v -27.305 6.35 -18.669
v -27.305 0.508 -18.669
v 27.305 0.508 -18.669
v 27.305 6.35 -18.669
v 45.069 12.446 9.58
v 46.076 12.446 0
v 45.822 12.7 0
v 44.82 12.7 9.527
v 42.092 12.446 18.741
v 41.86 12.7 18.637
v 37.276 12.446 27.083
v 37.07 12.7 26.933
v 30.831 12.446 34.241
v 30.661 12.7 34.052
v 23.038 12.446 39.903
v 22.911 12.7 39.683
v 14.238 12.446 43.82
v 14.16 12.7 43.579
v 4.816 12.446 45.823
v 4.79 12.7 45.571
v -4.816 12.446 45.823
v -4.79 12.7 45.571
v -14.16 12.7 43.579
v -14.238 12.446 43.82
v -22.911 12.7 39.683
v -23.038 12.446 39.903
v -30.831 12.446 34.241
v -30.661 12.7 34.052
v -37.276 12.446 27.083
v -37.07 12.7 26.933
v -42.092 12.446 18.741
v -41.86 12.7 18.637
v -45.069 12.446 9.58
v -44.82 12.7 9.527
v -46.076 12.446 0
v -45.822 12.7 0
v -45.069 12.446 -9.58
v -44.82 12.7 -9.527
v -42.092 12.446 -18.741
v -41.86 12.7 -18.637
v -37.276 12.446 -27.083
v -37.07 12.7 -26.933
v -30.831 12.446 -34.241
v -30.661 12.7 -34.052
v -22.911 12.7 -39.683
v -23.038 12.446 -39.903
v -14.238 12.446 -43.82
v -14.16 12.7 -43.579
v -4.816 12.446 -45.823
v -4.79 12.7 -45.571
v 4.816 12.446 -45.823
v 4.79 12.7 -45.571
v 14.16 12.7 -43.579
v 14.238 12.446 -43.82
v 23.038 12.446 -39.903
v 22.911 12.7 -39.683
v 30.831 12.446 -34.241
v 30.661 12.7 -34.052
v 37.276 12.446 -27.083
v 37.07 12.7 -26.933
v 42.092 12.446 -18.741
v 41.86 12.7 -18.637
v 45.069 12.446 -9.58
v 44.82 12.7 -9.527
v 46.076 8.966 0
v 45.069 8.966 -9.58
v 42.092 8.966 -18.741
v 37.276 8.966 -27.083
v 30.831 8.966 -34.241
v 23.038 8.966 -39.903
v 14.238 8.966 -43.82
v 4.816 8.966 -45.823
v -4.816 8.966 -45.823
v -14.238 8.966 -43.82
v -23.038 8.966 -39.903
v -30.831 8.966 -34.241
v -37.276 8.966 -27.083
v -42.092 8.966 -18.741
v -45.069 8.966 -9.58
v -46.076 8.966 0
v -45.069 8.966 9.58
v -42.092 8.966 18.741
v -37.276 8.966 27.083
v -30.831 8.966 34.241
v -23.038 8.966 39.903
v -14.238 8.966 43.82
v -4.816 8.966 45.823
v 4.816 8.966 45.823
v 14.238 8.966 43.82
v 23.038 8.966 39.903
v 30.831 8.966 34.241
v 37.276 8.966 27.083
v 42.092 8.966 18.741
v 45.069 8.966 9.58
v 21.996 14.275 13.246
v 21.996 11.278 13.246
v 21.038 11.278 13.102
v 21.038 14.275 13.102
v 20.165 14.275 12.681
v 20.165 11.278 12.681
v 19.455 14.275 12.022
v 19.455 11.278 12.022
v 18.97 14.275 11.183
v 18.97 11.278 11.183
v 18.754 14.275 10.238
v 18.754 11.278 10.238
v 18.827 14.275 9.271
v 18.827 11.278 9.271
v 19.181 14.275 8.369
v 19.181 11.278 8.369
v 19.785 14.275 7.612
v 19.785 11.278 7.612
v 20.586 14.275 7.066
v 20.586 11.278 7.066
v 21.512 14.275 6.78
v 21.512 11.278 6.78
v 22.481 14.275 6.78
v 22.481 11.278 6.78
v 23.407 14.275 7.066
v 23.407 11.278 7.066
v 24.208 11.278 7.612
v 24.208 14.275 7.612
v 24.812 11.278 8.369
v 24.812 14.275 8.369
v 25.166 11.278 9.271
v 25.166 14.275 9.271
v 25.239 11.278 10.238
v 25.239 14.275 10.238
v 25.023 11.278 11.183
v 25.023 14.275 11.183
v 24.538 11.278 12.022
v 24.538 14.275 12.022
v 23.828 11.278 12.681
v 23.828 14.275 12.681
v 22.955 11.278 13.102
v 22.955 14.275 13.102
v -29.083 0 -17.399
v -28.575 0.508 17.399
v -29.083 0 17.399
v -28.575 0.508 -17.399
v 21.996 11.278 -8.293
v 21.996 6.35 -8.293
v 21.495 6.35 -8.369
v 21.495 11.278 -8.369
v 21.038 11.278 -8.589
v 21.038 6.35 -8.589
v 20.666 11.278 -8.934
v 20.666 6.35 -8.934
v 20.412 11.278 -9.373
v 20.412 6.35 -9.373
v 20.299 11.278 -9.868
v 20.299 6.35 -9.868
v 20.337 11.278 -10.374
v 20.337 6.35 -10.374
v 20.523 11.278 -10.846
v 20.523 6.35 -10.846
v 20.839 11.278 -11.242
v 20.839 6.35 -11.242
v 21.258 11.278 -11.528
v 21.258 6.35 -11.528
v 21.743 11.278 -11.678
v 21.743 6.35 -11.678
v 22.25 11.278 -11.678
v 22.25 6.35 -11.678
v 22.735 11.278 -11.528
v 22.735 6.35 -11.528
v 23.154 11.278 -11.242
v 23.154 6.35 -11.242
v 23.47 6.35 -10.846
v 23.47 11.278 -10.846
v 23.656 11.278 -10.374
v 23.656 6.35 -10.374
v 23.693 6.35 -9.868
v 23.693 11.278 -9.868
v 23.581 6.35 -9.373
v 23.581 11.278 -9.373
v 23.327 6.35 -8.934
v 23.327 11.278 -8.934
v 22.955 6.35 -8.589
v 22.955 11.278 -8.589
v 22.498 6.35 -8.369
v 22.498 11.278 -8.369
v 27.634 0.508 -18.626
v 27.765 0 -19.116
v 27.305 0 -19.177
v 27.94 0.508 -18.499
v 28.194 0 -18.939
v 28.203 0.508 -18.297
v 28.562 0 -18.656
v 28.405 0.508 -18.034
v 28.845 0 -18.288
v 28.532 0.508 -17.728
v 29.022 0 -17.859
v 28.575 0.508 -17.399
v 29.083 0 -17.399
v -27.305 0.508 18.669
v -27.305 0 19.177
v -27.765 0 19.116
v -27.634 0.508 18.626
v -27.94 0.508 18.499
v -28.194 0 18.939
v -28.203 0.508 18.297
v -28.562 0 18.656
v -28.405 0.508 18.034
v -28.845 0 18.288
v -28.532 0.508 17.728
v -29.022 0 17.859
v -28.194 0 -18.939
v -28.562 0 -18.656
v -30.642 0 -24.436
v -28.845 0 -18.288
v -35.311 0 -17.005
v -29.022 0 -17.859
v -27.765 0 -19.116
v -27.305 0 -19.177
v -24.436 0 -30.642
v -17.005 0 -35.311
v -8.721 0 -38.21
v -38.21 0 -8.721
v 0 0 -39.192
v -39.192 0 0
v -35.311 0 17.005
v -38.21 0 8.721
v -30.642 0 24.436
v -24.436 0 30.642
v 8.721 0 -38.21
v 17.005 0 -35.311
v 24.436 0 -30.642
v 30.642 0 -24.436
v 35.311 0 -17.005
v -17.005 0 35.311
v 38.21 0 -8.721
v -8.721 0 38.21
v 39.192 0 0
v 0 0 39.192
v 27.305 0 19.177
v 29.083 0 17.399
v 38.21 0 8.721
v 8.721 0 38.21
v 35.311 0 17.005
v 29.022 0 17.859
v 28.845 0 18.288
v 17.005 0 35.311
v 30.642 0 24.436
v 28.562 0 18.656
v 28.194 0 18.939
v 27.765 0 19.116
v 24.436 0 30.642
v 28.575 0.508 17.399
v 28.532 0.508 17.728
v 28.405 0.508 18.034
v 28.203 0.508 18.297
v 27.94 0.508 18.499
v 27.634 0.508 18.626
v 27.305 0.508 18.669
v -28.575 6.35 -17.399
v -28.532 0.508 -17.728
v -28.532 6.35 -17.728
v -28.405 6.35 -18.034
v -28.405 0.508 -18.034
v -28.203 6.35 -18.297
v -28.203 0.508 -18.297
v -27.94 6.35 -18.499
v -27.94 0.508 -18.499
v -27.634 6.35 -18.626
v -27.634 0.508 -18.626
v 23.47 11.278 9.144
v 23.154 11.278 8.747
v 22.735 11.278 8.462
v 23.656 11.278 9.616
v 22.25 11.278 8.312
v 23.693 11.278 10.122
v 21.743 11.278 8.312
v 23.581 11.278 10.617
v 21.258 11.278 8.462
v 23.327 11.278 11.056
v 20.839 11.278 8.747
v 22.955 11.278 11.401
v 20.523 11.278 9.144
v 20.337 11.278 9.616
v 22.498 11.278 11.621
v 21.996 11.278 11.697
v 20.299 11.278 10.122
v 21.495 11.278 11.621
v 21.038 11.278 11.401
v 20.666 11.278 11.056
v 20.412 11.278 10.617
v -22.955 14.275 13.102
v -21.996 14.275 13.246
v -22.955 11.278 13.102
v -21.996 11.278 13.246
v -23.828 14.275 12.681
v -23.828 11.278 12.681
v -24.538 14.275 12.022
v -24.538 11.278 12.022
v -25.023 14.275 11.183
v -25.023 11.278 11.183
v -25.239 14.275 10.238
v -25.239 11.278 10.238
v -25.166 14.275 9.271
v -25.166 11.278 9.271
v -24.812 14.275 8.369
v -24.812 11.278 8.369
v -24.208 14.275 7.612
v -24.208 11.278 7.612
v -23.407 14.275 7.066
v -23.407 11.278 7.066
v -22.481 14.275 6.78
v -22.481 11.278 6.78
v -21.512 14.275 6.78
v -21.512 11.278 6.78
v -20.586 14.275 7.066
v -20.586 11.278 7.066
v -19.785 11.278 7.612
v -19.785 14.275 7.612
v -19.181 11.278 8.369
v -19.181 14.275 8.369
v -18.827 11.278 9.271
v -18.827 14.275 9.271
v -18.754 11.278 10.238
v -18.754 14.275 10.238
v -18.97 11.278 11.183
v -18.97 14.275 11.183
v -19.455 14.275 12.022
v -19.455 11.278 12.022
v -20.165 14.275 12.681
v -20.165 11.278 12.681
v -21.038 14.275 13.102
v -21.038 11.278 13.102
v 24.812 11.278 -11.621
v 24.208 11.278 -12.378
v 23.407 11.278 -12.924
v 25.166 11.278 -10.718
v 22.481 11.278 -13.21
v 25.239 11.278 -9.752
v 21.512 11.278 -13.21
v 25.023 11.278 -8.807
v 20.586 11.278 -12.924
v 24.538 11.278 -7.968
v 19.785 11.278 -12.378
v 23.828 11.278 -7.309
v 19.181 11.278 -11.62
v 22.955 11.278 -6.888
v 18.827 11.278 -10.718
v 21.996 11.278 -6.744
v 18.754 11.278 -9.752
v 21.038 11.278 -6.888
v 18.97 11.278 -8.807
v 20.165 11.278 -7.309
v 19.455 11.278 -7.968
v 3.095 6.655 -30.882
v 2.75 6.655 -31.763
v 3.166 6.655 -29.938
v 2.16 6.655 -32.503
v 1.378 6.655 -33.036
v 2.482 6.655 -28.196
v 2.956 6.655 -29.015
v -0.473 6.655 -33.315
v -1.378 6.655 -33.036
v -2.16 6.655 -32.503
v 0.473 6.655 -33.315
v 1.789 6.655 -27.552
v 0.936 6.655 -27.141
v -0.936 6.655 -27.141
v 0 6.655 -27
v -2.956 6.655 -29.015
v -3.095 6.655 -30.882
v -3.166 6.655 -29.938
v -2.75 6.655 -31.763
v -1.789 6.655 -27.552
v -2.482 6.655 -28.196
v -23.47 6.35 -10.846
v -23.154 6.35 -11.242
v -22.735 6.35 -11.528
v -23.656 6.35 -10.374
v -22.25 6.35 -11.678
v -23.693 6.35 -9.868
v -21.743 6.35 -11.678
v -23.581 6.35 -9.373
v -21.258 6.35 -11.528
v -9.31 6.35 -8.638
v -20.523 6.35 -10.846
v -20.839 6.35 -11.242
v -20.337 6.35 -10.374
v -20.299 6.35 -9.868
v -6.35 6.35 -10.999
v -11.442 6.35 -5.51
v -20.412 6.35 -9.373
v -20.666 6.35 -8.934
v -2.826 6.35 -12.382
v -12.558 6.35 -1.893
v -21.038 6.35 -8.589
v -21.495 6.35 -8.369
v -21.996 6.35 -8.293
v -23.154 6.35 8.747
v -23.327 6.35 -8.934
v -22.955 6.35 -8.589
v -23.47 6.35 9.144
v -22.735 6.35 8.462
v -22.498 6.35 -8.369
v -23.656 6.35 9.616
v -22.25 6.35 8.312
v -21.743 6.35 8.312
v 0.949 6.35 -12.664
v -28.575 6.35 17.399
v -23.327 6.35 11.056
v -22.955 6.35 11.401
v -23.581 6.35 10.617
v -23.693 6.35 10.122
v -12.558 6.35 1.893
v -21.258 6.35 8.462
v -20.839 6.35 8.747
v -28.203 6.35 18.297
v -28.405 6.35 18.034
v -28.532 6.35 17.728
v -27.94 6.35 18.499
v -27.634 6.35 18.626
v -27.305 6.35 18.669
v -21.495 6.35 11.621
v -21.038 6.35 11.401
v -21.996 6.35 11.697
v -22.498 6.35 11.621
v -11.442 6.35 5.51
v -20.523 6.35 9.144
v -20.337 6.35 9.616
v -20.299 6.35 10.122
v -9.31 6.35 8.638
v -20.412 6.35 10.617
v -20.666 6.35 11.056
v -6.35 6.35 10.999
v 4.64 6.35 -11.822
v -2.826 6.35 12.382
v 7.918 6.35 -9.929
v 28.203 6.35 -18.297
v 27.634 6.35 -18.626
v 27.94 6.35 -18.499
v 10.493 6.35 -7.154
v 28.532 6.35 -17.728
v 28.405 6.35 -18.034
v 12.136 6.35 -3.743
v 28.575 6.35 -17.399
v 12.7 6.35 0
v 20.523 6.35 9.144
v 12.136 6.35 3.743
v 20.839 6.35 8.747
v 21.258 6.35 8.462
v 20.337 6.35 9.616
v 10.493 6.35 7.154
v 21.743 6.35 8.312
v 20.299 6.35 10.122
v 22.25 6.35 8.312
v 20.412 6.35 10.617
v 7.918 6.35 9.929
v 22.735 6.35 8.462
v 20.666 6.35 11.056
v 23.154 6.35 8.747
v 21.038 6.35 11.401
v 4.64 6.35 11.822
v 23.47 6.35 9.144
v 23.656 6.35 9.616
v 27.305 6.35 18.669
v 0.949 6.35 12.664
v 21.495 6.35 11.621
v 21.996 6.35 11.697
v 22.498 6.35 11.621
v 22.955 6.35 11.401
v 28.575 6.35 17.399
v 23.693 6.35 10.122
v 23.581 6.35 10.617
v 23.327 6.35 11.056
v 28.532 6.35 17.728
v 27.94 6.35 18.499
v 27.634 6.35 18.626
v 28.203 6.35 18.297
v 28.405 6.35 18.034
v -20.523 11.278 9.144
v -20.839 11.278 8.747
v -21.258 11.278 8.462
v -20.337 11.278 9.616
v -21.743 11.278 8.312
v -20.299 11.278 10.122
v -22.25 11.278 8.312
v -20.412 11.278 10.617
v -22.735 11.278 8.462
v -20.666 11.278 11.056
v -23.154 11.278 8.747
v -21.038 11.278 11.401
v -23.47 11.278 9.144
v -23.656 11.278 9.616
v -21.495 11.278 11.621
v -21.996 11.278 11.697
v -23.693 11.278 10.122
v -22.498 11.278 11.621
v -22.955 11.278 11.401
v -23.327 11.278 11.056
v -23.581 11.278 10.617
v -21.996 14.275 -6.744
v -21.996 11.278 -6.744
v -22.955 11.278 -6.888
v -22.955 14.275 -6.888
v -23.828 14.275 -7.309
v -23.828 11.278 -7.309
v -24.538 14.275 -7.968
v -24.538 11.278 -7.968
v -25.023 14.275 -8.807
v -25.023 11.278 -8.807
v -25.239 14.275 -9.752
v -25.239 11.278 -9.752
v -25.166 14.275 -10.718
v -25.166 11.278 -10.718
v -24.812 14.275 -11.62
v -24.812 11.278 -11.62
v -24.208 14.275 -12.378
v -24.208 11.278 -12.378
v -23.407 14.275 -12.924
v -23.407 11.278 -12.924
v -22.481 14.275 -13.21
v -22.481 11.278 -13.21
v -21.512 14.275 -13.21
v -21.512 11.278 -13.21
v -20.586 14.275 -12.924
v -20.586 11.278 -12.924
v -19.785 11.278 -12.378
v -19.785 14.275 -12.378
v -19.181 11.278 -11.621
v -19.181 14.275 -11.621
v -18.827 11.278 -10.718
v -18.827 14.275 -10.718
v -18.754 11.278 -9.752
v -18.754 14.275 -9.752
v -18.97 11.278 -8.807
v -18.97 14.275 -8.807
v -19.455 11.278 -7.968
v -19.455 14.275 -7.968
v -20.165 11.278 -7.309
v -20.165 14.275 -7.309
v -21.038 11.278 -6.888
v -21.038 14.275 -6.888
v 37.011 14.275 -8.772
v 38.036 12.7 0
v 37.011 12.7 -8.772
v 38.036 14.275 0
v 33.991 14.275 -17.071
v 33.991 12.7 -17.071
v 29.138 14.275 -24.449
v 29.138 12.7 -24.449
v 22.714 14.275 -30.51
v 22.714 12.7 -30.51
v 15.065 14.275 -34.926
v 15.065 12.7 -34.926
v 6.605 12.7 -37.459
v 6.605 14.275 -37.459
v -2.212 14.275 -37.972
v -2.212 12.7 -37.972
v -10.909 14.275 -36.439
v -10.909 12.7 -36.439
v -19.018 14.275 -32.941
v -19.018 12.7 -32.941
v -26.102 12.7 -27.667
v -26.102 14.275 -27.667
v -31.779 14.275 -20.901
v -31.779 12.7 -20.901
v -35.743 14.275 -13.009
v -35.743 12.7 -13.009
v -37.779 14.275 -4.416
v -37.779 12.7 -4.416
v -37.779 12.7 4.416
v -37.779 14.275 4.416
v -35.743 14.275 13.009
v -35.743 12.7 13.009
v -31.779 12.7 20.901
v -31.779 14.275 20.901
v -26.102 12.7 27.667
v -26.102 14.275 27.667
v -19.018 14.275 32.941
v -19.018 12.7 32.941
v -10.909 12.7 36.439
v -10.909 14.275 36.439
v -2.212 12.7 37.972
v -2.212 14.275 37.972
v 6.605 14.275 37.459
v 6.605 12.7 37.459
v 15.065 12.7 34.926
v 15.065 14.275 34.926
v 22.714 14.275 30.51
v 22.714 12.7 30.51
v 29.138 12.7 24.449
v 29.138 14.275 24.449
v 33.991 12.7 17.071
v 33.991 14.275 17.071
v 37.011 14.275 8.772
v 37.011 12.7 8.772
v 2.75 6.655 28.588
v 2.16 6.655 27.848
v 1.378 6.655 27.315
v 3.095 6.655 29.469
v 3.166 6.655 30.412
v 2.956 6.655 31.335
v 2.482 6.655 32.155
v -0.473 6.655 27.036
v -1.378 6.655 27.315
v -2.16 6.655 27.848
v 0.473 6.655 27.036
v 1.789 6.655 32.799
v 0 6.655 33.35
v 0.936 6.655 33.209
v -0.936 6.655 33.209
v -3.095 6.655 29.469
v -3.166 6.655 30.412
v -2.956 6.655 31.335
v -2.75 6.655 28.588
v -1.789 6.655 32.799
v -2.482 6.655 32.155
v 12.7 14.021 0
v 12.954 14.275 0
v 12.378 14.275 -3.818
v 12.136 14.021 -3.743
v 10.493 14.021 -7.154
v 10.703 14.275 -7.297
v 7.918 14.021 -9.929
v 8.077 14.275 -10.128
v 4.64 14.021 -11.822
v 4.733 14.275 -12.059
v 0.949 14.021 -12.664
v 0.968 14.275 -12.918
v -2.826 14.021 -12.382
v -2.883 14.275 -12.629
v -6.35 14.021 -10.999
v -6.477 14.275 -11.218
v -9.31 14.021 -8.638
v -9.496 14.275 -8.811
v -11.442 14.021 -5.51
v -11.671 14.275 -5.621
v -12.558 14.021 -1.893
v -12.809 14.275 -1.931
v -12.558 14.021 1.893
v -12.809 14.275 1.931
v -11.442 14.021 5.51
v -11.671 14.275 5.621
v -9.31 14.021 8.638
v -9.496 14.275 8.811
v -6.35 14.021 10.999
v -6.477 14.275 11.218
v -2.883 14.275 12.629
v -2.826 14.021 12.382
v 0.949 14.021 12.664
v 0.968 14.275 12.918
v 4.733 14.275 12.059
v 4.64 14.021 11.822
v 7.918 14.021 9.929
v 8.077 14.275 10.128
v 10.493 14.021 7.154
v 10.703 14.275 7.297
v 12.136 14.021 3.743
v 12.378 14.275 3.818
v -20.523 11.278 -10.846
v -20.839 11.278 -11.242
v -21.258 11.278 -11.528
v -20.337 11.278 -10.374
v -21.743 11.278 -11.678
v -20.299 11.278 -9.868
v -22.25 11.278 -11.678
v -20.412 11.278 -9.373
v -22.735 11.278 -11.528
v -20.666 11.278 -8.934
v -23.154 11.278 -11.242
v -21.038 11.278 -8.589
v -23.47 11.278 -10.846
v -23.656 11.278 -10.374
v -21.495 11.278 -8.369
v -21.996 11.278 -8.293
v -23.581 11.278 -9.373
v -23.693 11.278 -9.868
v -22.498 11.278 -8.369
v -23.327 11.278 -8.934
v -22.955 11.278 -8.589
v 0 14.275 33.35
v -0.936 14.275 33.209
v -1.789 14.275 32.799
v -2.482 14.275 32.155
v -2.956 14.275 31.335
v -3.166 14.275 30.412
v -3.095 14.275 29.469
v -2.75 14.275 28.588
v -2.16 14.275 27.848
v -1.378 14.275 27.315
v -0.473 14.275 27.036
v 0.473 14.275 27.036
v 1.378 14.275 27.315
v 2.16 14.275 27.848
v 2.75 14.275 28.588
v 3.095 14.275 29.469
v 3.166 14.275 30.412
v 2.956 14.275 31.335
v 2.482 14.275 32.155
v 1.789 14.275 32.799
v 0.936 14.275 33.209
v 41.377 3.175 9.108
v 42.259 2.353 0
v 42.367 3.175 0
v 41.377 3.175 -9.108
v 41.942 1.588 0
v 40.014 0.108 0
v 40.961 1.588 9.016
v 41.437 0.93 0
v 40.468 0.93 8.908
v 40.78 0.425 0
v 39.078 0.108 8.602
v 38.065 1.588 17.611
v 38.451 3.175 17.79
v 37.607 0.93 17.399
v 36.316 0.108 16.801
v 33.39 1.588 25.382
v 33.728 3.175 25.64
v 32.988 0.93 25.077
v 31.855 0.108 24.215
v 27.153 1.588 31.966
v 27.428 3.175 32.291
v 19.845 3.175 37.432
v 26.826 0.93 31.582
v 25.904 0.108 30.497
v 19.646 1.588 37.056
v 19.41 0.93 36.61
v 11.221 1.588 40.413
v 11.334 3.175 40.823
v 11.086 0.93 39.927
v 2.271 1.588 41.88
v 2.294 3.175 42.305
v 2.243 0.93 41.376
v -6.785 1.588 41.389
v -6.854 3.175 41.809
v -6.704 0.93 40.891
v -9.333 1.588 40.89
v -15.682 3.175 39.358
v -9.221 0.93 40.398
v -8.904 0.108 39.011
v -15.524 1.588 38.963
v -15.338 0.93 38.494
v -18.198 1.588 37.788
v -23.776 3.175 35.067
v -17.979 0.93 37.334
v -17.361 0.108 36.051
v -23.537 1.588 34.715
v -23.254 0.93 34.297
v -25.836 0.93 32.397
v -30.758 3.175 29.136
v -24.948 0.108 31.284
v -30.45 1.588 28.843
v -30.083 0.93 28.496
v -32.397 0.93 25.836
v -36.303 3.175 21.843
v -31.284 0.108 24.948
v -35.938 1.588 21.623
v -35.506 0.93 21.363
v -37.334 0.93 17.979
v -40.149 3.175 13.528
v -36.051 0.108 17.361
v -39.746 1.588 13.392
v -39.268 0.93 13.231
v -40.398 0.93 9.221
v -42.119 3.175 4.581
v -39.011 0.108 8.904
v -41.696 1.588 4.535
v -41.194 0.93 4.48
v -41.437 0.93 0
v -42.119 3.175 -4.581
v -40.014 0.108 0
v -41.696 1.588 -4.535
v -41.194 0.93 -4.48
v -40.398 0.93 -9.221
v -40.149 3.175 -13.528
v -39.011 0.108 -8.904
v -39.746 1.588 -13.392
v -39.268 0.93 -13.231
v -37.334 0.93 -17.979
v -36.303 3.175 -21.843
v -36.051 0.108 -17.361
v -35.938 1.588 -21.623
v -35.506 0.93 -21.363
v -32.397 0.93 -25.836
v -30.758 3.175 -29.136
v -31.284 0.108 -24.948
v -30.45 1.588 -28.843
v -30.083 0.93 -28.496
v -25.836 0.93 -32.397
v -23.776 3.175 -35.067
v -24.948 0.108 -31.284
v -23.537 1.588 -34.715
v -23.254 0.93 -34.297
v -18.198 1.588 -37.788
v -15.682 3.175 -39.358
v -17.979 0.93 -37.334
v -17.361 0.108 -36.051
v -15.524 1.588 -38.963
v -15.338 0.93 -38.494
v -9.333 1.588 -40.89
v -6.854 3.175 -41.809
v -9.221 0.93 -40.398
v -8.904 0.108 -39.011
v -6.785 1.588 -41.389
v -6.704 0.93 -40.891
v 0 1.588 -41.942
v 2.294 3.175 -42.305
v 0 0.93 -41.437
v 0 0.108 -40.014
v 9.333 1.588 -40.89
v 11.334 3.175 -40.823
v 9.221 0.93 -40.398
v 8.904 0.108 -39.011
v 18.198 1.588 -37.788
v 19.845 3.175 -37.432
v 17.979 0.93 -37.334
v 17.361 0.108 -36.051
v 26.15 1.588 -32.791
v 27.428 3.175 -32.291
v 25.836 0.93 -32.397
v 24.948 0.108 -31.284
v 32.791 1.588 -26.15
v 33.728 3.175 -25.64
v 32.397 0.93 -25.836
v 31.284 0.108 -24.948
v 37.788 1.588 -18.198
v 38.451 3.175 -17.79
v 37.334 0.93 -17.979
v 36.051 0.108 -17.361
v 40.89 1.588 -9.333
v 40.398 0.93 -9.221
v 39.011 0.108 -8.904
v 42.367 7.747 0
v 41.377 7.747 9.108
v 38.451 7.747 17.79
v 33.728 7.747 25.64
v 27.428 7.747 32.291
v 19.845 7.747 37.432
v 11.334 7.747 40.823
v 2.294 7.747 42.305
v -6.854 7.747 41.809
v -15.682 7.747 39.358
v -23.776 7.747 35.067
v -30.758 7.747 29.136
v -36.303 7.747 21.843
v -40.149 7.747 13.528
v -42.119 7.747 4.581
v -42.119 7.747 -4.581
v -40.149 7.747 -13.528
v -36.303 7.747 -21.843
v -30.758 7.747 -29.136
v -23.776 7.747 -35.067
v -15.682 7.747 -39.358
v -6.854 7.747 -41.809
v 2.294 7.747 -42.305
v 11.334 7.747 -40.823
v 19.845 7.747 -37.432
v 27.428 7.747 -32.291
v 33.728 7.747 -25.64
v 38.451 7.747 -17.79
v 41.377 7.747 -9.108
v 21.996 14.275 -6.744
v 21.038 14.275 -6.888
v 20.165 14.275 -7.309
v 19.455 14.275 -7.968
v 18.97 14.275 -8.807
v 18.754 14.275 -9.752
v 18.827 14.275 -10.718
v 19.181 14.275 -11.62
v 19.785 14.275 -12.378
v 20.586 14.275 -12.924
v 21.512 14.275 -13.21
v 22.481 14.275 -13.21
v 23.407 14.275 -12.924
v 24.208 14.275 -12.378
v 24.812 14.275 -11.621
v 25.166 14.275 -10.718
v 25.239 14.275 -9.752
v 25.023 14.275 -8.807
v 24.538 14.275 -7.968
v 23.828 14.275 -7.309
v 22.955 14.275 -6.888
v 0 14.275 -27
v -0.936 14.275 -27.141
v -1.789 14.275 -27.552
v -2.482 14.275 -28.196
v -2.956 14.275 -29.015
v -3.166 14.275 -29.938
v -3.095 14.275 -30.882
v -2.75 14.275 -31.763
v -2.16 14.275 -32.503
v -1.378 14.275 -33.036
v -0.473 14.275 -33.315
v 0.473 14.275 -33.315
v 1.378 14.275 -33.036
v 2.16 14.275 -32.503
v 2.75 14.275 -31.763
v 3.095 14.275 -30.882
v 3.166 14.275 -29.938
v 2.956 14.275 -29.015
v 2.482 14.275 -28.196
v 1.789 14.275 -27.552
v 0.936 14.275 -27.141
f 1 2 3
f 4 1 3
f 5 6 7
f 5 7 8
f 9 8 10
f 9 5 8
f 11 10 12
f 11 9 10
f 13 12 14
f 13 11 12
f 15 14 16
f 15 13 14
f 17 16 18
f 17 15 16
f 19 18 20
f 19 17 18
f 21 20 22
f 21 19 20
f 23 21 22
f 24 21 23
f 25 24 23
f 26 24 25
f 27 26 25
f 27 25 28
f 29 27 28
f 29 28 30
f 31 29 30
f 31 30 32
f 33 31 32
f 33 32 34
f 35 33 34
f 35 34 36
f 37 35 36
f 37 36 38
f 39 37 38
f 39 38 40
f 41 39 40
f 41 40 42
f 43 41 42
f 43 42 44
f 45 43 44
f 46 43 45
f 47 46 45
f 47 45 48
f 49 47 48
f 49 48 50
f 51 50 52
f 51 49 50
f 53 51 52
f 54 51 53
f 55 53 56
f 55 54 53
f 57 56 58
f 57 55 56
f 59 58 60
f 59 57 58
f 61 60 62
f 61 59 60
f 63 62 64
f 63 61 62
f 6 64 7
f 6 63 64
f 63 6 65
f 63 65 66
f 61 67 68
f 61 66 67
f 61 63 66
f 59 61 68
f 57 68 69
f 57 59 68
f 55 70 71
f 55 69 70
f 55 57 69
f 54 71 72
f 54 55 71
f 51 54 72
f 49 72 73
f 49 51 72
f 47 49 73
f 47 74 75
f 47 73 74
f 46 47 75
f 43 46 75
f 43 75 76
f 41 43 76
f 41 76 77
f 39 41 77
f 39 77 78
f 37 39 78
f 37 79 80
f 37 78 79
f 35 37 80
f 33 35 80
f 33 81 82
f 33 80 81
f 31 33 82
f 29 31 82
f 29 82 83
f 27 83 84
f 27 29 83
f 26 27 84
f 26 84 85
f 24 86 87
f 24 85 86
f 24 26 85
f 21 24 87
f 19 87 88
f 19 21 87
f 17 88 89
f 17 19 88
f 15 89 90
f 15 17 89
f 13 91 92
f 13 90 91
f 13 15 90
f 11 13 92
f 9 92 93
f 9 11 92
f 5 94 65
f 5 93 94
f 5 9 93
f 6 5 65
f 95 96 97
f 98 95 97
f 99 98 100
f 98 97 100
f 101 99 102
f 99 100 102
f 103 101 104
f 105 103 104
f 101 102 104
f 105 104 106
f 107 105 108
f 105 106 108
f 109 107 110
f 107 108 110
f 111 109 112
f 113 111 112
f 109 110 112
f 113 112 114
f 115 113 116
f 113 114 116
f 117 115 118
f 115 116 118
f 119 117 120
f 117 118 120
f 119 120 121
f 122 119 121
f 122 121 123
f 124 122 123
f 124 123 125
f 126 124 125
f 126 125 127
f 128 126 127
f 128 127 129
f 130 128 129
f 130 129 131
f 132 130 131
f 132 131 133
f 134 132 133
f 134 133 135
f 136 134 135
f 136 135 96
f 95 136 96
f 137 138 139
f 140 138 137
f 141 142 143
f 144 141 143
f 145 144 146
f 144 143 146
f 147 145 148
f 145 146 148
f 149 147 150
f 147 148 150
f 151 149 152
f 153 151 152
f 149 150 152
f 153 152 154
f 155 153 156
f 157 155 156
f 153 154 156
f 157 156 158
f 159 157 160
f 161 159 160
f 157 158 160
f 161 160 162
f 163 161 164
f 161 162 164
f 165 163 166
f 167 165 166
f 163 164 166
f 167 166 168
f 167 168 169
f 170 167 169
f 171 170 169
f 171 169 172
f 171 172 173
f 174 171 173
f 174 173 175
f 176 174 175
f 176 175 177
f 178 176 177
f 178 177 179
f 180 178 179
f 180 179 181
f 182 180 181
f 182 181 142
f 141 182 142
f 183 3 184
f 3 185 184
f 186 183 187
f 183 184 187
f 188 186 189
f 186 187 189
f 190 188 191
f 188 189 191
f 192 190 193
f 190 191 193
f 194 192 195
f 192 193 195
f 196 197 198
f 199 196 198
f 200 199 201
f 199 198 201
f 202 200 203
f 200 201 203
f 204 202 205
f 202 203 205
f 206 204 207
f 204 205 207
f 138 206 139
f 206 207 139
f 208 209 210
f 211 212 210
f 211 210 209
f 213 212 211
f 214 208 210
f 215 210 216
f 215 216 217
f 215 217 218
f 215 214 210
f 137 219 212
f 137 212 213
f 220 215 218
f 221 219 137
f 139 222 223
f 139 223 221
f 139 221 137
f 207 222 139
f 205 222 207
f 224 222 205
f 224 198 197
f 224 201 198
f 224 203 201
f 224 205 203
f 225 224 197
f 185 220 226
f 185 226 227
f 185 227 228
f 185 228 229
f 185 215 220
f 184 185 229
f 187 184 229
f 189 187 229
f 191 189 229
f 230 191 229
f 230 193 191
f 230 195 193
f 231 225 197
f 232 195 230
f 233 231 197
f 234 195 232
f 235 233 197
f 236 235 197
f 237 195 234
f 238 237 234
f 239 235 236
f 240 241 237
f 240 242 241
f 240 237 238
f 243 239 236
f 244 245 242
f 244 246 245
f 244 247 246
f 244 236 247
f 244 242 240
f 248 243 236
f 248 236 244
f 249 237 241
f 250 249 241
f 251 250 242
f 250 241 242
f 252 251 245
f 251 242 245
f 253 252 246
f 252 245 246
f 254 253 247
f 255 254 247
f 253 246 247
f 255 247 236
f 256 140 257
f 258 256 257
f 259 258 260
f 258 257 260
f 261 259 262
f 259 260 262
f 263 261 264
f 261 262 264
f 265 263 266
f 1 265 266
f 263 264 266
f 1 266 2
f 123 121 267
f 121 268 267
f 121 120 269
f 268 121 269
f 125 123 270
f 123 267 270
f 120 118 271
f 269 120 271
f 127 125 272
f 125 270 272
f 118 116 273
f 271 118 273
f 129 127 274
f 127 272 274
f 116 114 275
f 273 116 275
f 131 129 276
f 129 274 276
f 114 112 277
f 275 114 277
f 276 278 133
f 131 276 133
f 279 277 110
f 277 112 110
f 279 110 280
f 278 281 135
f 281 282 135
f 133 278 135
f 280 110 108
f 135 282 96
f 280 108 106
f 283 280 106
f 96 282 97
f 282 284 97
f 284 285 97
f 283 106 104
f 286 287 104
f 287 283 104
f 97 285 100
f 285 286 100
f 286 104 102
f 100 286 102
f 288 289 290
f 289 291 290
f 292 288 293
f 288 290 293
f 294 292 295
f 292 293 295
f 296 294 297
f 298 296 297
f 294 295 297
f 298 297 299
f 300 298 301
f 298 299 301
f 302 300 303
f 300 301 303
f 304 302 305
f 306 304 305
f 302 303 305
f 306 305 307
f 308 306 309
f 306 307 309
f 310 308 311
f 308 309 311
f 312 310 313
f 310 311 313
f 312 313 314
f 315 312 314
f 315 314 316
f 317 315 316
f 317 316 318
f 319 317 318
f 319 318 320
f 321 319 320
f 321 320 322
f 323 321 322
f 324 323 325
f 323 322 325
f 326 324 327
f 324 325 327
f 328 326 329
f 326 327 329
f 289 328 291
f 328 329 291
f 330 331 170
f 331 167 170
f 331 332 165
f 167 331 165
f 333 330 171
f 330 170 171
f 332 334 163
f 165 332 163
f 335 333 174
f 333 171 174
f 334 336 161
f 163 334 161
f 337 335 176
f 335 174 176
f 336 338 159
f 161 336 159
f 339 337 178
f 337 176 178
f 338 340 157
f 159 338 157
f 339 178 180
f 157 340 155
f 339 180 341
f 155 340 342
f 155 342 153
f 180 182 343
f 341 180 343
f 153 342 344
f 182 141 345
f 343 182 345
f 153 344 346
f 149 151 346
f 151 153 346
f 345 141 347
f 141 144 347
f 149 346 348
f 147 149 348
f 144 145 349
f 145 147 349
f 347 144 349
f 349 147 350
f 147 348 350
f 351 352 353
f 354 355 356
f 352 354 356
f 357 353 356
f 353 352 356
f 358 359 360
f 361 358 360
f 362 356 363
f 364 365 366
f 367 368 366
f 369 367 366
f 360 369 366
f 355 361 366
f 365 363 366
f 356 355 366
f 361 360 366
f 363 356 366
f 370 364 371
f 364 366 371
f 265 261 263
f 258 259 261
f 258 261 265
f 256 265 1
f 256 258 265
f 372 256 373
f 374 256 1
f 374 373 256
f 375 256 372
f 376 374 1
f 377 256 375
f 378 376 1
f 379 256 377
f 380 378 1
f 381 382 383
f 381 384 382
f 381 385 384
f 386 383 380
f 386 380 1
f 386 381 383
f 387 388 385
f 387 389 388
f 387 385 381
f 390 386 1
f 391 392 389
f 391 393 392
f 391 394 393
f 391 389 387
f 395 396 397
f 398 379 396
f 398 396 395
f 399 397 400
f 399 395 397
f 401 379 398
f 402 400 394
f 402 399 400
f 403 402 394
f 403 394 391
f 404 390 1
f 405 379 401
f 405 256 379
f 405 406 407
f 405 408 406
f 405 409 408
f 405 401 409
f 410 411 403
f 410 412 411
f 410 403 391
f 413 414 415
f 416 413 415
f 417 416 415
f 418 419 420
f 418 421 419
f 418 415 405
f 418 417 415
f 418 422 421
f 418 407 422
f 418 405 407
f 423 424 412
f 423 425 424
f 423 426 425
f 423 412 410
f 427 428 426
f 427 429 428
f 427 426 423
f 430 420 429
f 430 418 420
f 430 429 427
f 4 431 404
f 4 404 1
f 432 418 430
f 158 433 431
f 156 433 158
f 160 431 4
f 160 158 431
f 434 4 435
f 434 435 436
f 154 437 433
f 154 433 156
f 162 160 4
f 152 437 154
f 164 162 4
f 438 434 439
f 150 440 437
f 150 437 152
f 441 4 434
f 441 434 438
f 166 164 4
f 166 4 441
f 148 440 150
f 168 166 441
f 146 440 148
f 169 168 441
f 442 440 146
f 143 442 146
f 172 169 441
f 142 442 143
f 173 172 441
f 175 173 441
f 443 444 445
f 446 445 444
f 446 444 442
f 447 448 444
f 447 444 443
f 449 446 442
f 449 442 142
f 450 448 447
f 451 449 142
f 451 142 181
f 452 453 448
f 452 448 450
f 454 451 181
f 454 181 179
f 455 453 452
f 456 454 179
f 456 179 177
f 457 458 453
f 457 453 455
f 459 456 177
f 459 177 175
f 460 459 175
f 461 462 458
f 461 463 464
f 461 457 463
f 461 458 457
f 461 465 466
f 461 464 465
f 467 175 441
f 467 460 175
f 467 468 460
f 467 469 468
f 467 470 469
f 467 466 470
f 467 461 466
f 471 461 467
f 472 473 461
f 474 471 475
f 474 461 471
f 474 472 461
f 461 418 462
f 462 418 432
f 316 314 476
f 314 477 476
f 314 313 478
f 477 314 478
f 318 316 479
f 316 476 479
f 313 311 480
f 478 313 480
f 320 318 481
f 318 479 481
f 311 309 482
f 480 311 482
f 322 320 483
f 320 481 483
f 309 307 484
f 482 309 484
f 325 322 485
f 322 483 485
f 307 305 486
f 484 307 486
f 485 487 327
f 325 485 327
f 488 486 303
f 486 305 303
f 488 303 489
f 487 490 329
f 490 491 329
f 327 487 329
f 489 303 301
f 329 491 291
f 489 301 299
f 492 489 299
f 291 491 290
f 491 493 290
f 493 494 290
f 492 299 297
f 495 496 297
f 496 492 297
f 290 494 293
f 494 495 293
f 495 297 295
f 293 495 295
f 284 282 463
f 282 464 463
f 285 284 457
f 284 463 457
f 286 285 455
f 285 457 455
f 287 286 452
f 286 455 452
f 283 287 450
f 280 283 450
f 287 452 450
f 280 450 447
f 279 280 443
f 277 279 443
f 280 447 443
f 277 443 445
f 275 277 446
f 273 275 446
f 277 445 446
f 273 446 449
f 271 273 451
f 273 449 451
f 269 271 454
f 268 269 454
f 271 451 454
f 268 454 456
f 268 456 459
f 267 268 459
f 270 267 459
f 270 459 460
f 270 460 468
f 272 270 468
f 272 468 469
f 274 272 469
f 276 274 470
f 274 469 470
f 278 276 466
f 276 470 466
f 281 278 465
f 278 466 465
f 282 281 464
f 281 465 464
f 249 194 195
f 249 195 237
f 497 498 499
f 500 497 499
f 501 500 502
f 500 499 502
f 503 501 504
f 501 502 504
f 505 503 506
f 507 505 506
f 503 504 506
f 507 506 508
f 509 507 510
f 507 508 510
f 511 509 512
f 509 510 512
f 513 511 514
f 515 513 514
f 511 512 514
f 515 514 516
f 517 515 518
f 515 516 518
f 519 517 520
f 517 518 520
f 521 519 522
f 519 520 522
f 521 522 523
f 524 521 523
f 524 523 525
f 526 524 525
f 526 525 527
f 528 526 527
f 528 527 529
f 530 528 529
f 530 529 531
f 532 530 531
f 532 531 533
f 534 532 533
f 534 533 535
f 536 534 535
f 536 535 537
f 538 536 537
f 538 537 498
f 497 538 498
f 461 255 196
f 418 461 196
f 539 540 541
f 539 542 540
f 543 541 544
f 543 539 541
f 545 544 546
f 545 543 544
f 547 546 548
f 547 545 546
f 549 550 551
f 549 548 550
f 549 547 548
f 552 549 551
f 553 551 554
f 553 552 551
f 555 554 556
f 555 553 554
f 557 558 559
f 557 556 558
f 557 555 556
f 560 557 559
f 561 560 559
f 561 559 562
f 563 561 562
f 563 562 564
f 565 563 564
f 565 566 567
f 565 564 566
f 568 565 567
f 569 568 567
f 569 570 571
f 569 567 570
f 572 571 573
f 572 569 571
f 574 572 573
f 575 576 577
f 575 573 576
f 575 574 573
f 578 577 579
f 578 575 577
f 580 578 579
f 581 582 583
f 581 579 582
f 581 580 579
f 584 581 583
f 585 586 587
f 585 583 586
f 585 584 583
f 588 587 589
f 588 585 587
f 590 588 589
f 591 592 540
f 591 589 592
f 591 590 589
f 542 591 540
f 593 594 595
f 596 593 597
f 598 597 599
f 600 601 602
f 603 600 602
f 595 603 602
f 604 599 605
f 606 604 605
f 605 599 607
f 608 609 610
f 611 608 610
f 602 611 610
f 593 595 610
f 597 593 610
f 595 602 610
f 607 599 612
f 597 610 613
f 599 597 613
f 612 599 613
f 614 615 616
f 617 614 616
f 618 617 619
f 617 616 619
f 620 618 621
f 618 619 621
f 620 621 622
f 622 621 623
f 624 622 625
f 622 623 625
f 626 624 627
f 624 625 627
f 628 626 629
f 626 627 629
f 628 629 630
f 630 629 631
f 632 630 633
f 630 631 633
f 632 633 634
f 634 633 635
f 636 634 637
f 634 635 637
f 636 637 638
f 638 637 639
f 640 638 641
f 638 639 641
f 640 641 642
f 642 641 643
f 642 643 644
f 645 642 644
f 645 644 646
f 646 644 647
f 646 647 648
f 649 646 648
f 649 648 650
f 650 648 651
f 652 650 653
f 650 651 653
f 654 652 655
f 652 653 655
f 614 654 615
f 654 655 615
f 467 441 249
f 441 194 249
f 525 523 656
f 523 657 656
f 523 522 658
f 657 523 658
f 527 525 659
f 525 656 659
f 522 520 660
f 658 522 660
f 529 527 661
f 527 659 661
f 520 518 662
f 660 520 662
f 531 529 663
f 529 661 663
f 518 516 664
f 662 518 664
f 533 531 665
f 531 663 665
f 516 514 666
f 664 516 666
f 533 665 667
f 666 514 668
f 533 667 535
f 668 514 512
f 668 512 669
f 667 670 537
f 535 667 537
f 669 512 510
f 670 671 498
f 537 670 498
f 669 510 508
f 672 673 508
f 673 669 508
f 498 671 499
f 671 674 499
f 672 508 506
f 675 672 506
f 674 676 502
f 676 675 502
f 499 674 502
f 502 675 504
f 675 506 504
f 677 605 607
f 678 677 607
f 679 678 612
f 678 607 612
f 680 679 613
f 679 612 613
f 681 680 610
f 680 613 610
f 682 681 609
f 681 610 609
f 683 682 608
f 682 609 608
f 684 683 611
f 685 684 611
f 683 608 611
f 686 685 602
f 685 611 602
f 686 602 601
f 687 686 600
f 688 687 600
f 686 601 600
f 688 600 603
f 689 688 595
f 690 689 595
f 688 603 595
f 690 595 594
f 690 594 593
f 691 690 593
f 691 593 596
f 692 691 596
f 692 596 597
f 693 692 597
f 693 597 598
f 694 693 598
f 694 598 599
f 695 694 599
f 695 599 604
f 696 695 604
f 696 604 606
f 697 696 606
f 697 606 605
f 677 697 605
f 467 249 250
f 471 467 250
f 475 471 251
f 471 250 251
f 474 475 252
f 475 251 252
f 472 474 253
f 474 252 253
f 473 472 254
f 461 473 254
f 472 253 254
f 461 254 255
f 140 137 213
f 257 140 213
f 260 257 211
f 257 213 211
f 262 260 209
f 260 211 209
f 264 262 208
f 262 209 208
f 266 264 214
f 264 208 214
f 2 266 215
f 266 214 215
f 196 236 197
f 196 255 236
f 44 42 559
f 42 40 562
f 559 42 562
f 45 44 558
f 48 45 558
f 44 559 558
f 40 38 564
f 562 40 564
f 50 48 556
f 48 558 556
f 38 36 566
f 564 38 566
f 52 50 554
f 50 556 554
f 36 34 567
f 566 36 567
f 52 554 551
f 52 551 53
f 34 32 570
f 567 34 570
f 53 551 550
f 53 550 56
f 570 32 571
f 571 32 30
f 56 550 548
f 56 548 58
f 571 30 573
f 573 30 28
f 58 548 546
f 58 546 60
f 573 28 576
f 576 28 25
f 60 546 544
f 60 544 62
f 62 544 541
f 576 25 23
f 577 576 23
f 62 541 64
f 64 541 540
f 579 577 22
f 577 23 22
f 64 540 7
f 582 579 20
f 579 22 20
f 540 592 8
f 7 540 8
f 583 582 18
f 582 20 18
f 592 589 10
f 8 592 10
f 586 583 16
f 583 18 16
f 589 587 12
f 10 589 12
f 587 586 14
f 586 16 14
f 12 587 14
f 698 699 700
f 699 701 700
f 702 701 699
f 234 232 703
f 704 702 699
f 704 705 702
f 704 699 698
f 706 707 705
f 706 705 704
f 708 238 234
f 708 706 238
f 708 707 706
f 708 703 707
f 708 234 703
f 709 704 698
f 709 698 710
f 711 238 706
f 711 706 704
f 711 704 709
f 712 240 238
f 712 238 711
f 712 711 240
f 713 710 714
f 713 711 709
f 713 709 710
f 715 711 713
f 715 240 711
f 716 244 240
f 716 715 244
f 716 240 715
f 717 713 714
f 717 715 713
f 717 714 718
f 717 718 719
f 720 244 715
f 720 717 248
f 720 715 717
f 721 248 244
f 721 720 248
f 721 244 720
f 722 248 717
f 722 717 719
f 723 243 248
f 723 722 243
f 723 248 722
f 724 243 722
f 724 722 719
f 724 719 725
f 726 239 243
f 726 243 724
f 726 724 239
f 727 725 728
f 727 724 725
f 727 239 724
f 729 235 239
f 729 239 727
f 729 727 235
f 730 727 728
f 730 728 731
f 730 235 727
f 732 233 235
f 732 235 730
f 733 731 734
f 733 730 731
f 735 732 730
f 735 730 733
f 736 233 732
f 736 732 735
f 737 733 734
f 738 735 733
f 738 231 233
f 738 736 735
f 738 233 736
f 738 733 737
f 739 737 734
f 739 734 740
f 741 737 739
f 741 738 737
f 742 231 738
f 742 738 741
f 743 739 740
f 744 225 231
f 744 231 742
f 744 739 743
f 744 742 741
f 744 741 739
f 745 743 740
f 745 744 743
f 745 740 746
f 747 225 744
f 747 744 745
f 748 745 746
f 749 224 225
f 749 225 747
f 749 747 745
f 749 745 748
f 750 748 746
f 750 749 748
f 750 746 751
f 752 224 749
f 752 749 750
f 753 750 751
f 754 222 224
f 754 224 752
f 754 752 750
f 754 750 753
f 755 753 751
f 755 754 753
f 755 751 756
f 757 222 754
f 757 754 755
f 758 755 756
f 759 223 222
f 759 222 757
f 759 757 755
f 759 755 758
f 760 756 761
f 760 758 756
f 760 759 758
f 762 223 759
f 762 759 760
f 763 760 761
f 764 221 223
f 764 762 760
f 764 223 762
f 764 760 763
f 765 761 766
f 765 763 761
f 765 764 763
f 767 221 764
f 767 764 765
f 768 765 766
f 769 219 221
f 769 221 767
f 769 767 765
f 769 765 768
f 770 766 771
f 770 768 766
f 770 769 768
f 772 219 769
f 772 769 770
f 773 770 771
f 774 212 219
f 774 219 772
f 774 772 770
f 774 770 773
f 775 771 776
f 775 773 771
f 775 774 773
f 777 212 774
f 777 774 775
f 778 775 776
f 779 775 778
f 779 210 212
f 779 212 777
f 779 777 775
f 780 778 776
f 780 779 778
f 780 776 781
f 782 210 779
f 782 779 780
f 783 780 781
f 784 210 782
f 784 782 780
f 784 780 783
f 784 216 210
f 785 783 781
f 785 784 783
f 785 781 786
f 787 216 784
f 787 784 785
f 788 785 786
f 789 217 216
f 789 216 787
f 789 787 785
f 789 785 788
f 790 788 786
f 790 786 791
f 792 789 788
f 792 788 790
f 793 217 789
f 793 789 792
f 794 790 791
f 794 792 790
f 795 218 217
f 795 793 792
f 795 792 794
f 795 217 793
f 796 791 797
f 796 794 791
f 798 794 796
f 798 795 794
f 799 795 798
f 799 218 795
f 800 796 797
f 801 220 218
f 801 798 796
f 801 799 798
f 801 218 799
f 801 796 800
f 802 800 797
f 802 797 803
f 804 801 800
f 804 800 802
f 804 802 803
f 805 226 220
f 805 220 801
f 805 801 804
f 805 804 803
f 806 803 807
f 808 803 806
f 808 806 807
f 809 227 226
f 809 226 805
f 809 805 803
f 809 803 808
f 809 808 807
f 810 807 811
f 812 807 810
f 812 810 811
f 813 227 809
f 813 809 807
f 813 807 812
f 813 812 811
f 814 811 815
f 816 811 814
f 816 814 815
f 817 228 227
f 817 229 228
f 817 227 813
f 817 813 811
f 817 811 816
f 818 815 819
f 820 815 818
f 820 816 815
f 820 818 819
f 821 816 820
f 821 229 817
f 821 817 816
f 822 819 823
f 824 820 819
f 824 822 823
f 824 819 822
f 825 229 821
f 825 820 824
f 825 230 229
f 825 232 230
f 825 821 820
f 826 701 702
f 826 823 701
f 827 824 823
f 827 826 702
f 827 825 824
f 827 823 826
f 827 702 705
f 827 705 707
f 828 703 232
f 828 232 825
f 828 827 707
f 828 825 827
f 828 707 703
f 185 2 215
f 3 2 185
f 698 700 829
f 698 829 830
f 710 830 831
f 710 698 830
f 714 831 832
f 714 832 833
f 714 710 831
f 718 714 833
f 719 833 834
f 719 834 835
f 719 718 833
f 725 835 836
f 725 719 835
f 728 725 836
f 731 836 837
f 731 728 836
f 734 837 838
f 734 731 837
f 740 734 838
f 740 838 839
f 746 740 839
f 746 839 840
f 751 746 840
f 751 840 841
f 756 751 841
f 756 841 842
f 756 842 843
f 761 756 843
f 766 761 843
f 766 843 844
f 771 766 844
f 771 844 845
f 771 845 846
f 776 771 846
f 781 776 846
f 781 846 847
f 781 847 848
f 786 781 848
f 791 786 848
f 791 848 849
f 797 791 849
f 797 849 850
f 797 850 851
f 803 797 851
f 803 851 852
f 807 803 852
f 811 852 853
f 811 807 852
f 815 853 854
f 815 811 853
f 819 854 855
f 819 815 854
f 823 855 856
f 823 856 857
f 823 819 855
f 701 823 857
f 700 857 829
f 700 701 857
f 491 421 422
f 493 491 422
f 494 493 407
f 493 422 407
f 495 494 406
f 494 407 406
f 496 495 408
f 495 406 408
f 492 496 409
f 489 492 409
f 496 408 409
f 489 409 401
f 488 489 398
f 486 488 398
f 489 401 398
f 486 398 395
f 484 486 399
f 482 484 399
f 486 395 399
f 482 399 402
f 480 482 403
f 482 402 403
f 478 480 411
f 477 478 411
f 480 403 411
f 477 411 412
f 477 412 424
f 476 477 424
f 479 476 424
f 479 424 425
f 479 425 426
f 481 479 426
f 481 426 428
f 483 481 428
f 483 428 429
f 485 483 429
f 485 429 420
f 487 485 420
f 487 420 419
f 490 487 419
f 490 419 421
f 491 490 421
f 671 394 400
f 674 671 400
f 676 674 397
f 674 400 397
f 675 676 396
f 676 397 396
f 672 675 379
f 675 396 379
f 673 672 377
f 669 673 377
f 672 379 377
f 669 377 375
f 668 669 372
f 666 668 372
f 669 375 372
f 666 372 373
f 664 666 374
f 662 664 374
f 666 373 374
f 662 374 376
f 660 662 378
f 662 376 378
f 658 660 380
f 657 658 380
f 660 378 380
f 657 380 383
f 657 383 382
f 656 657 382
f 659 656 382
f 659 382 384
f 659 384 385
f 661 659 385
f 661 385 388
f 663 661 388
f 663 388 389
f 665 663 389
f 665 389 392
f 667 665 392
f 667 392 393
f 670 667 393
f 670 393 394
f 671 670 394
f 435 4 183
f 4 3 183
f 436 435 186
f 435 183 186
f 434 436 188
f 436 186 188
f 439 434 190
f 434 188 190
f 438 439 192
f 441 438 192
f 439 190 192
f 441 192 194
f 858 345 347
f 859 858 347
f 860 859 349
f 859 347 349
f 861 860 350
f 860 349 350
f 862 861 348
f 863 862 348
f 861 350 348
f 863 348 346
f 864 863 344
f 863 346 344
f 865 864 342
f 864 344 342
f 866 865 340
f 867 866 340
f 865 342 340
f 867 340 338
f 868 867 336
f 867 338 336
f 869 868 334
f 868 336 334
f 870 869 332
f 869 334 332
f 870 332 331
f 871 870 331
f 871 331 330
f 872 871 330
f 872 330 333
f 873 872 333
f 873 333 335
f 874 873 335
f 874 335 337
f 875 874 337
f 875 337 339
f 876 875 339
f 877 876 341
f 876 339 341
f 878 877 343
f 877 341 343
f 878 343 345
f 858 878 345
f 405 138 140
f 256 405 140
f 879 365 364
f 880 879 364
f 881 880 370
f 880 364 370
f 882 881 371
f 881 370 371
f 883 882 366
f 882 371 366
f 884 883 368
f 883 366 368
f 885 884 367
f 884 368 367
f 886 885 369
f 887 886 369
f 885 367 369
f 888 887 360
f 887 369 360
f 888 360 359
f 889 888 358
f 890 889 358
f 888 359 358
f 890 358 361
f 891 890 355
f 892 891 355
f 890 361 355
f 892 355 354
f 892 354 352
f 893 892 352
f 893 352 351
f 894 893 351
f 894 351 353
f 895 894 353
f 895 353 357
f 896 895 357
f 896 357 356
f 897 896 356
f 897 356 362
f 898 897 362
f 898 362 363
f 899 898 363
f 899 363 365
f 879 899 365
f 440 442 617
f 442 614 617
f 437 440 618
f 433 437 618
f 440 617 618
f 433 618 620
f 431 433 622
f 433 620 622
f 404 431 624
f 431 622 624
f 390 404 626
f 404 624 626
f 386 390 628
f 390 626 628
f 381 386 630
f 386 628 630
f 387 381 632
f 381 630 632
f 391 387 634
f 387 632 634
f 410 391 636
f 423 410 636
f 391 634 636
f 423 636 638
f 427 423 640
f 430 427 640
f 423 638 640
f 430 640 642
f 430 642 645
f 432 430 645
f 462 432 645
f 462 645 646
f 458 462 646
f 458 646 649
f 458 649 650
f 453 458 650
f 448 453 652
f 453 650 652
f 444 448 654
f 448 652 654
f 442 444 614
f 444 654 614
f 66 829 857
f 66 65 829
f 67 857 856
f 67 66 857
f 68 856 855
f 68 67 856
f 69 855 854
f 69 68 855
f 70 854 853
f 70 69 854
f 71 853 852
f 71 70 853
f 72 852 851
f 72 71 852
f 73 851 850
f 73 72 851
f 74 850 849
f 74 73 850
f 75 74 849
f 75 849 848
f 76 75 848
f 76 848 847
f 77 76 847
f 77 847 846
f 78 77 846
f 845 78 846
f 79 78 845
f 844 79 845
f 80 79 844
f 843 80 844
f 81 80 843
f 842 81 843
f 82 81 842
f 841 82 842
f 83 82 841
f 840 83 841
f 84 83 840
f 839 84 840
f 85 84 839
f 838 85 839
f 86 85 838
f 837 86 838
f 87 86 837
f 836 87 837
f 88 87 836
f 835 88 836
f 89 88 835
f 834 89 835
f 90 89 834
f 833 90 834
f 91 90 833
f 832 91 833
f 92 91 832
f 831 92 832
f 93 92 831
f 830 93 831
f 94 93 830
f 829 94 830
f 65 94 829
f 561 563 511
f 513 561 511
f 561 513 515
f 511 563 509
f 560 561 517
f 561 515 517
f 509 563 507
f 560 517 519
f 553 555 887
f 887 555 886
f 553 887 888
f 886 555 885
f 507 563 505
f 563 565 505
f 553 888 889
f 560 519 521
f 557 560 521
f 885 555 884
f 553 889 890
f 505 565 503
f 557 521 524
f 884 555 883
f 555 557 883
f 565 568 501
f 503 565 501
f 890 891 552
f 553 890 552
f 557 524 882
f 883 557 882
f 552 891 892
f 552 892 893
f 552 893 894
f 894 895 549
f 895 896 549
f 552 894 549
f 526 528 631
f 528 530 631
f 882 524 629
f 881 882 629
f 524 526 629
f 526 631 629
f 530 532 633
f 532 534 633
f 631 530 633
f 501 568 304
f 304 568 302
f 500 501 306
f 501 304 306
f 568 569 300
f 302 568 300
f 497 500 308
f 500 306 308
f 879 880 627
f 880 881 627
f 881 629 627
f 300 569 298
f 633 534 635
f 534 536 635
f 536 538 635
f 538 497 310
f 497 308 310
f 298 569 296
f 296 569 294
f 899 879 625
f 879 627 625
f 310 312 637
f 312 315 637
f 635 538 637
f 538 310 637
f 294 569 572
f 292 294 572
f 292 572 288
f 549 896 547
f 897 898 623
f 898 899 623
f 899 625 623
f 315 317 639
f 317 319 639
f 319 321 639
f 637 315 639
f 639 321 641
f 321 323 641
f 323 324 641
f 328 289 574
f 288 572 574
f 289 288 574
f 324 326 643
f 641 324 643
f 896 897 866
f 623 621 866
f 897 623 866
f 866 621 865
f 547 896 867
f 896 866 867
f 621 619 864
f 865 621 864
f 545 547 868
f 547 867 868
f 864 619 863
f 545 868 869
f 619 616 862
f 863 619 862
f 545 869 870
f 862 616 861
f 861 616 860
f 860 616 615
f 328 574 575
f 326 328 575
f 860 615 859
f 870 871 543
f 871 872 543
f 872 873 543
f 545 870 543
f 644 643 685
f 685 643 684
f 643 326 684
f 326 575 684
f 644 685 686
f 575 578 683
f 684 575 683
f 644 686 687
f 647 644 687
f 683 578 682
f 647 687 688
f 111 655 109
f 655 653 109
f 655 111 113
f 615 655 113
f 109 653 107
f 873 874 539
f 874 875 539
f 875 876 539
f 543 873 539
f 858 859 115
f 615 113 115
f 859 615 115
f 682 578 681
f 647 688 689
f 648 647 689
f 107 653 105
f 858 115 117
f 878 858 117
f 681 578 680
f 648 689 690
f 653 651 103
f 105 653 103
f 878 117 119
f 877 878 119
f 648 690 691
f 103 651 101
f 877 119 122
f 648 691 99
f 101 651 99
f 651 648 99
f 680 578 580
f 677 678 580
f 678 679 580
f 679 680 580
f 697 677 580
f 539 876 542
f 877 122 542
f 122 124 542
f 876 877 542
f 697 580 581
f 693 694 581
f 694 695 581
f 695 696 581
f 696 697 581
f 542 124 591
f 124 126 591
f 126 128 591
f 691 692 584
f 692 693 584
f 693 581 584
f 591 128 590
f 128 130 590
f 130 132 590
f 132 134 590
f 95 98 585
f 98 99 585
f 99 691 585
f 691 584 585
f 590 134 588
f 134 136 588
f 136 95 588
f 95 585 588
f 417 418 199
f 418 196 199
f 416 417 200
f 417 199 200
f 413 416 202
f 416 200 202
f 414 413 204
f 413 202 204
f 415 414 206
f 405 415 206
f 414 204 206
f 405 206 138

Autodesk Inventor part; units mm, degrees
ref_plane "YZ Plane" through (0, 0, 0) normal (1, 0, 0) x (0, 1, 0)
ref_plane "XZ Plane" through (0, 0, 0) normal (0, 1, 0) x (-1, 0, 0)
ref_plane "XY Plane" through (0, 0, 0) normal (0, 0, 1) x (1, 0, 0)
sketch "Sketch1" plane through (0, 0, 0) normal (0, 0, 1) x (1, 0, 0)
  line L0 (17.5514, 0) -> (46.0756, 0)
  line L1 (46.0756, 0) -> (46.0756, 12.7)
  line L2 (46.0756, 12.7) -> (0, 12.7)
  line L3 (0, 12.7) -> (0, 0)
  line L4 (17.5514, 12.7) -> (17.5514, 0)
  line L5 (46.0756, 8.9662) -> (42.3672, 8.9662)
  line L6 (42.3672, 7.747) -> (42.3672, 0)
  line L7 (46.0756, 7.747) -> (42.3672, 7.747)
  line L8 (46.0756, 8.9662) -> (42.3672, 7.747)
  line L9 (0, 11.1252) -> (0, 12.7)
  line L10 (17.5514, 0) -> (23.85, 0)
  line L11 (0, -2.5) -> (0, 0)
  line L12 (0, 12.7) -> (38.0365, 12.7)
  line L13 (38.0365, 12.7) -> (38.0365, 14.2748)
  line L14 (38.0365, 14.2748) -> (0, 14.2748)
  line L15 (0, 14.2748) -> (0, 12.7)
  line L16 (17.5514, 12.7) -> (17.5514, 14.2748)
  line L17 (0, 0) -> (17.5514, 0)
  dimension "d1" = 12.7
  dimension "d3" = 3.7338
  dimension "d5" = 4.953
  dimension "d8" = 17.5514
  dimension "d9" = 42.3672
  dimension "d10" = 46.0756
  dimension "d11" = 1.5748
  dimension "d12" = 38.0365
revolve "Revolution1" add sketch "Sketch1" angle 360 about axis through (0, 12.7, 0) along (0, -1, 0) contours L4 L2 L1 L8 L6 L0 | L17 L3 L2 L4 | L16 L14 L13 L2 | L2 L15 L14 L16
sketch "Sketch2" plane through (0, 14.2748, 0) normal (0, 1, 0) x (1, 0, 0)
  circle A0 centre (0, 0) radius 30.1752
  point P0 (0, 30.1752)
  point P1 (0, -30.1752)
  dimension "d14" = 60.3504
hole "Hole1" at (0, 14.2748, -30.1752) at (0, 14.2748, 30.1752) direction (0, -1, 0) diameter 6.35 depth 7.62
fillet "Fillet1" radius 3.175 1 edges at (-42.3672, 0, 0)
sketch "Sketch3" plane through (0, 0, 0) normal (0, -1, 0) x (1, 0, 0)
  line L0 (27.305, 18.669) -> (-27.305, 18.669)
  line L1 (-28.575, 17.399) -> (-28.575, -17.399)
  line L2 (-27.305, -18.669) -> (27.305, -18.669)
  line L3 (28.575, -17.399) -> (28.575, 17.399)
  line L4 (28.575, 18.669) -> (-28.575, -18.669) construction
  line L5 (-28.575, 18.669) -> (28.575, -18.669) construction
  arc A0 (27.305, -18.669) -> (28.575, -17.399) centre (27.305, -17.399) ccw
  arc A1 (28.575, 17.399) -> (27.305, 18.669) centre (27.305, 17.399) ccw
  arc A2 (-27.305, 18.669) -> (-28.575, 17.399) centre (-27.305, 17.399) ccw
  arc A3 (-28.575, -17.399) -> (-27.305, -18.669) centre (-27.305, -17.399) ccw
  point P0 (0, 0)
  dimension "d23" = 57.15
  dimension "d24" = 37.338
  dimension "d25" = 1.27
sketch "Sketch4" plane through (0, 14.2748, 0) normal (0, 1, 0) x (1, 0, 0)
  line L0 (21.9964, 9.9949) -> (-21.9964, 9.9949)
  line L1 (-21.9964, 9.9949) -> (-21.9964, -9.9949)
  line L2 (-21.9964, -9.9949) -> (21.9964, -9.9949)
  line L3 (21.9964, -9.9949) -> (21.9964, 9.9949)
  line L4 (21.9964, 9.9949) -> (-21.9964, -9.9949) construction
  line L5 (-21.9964, 9.9949) -> (21.9964, -9.9949) construction
  point P0 (0, 0)
  dimension "d26" = 19.9898
  dimension "d27" = 43.9928
hole "Hole2" at (21.9964, 14.2748, 9.9949) at (21.9964, 14.2748, -9.9949) at (-21.9964, 14.2748, 9.9949) at (-21.9964, 14.2748, -9.9949) direction (0, -1, 0) diameter 3.4036 end through all counterbore diameter 6.5024 counterbore depth 2.9972 clearance for "Socket Head Cap Screw" size "M3" standard "Ansi Metric M Profile"
extrude "Extrusion1" cut sketch "Sketch3" against normal blind 6.35
chamfer "Chamfer1" distance 0.508 angle 45 8 edges at (0, 0, 18.669) (28.203, 0, 18.297) (28.575, 0, 0) (28.203, 0, -18.297) (0, 0, -18.669) (-28.203, 0, -18.297) (-28.575, 0, 0) (-28.203, 0, 18.297)
sketch "Sketch5" plane through (0, 14.2748, 0) normal (0, 1, 0) x (1, 0, 0)
  circle A0 centre (0, 0) radius 12.7
  dimension "d40" = 25.4
extrude "Extrusion2" cut sketch "Sketch5" against normal through all
chamfer "Chamfer2" distance 0.254 angle 45 2 edges at (-46.0756, 12.7, 0) (-12.7, 14.2748, 0)
properties part number "2016.06.09 ps Hamamatsu PMT Adapter" material "Aluminum 6061"
